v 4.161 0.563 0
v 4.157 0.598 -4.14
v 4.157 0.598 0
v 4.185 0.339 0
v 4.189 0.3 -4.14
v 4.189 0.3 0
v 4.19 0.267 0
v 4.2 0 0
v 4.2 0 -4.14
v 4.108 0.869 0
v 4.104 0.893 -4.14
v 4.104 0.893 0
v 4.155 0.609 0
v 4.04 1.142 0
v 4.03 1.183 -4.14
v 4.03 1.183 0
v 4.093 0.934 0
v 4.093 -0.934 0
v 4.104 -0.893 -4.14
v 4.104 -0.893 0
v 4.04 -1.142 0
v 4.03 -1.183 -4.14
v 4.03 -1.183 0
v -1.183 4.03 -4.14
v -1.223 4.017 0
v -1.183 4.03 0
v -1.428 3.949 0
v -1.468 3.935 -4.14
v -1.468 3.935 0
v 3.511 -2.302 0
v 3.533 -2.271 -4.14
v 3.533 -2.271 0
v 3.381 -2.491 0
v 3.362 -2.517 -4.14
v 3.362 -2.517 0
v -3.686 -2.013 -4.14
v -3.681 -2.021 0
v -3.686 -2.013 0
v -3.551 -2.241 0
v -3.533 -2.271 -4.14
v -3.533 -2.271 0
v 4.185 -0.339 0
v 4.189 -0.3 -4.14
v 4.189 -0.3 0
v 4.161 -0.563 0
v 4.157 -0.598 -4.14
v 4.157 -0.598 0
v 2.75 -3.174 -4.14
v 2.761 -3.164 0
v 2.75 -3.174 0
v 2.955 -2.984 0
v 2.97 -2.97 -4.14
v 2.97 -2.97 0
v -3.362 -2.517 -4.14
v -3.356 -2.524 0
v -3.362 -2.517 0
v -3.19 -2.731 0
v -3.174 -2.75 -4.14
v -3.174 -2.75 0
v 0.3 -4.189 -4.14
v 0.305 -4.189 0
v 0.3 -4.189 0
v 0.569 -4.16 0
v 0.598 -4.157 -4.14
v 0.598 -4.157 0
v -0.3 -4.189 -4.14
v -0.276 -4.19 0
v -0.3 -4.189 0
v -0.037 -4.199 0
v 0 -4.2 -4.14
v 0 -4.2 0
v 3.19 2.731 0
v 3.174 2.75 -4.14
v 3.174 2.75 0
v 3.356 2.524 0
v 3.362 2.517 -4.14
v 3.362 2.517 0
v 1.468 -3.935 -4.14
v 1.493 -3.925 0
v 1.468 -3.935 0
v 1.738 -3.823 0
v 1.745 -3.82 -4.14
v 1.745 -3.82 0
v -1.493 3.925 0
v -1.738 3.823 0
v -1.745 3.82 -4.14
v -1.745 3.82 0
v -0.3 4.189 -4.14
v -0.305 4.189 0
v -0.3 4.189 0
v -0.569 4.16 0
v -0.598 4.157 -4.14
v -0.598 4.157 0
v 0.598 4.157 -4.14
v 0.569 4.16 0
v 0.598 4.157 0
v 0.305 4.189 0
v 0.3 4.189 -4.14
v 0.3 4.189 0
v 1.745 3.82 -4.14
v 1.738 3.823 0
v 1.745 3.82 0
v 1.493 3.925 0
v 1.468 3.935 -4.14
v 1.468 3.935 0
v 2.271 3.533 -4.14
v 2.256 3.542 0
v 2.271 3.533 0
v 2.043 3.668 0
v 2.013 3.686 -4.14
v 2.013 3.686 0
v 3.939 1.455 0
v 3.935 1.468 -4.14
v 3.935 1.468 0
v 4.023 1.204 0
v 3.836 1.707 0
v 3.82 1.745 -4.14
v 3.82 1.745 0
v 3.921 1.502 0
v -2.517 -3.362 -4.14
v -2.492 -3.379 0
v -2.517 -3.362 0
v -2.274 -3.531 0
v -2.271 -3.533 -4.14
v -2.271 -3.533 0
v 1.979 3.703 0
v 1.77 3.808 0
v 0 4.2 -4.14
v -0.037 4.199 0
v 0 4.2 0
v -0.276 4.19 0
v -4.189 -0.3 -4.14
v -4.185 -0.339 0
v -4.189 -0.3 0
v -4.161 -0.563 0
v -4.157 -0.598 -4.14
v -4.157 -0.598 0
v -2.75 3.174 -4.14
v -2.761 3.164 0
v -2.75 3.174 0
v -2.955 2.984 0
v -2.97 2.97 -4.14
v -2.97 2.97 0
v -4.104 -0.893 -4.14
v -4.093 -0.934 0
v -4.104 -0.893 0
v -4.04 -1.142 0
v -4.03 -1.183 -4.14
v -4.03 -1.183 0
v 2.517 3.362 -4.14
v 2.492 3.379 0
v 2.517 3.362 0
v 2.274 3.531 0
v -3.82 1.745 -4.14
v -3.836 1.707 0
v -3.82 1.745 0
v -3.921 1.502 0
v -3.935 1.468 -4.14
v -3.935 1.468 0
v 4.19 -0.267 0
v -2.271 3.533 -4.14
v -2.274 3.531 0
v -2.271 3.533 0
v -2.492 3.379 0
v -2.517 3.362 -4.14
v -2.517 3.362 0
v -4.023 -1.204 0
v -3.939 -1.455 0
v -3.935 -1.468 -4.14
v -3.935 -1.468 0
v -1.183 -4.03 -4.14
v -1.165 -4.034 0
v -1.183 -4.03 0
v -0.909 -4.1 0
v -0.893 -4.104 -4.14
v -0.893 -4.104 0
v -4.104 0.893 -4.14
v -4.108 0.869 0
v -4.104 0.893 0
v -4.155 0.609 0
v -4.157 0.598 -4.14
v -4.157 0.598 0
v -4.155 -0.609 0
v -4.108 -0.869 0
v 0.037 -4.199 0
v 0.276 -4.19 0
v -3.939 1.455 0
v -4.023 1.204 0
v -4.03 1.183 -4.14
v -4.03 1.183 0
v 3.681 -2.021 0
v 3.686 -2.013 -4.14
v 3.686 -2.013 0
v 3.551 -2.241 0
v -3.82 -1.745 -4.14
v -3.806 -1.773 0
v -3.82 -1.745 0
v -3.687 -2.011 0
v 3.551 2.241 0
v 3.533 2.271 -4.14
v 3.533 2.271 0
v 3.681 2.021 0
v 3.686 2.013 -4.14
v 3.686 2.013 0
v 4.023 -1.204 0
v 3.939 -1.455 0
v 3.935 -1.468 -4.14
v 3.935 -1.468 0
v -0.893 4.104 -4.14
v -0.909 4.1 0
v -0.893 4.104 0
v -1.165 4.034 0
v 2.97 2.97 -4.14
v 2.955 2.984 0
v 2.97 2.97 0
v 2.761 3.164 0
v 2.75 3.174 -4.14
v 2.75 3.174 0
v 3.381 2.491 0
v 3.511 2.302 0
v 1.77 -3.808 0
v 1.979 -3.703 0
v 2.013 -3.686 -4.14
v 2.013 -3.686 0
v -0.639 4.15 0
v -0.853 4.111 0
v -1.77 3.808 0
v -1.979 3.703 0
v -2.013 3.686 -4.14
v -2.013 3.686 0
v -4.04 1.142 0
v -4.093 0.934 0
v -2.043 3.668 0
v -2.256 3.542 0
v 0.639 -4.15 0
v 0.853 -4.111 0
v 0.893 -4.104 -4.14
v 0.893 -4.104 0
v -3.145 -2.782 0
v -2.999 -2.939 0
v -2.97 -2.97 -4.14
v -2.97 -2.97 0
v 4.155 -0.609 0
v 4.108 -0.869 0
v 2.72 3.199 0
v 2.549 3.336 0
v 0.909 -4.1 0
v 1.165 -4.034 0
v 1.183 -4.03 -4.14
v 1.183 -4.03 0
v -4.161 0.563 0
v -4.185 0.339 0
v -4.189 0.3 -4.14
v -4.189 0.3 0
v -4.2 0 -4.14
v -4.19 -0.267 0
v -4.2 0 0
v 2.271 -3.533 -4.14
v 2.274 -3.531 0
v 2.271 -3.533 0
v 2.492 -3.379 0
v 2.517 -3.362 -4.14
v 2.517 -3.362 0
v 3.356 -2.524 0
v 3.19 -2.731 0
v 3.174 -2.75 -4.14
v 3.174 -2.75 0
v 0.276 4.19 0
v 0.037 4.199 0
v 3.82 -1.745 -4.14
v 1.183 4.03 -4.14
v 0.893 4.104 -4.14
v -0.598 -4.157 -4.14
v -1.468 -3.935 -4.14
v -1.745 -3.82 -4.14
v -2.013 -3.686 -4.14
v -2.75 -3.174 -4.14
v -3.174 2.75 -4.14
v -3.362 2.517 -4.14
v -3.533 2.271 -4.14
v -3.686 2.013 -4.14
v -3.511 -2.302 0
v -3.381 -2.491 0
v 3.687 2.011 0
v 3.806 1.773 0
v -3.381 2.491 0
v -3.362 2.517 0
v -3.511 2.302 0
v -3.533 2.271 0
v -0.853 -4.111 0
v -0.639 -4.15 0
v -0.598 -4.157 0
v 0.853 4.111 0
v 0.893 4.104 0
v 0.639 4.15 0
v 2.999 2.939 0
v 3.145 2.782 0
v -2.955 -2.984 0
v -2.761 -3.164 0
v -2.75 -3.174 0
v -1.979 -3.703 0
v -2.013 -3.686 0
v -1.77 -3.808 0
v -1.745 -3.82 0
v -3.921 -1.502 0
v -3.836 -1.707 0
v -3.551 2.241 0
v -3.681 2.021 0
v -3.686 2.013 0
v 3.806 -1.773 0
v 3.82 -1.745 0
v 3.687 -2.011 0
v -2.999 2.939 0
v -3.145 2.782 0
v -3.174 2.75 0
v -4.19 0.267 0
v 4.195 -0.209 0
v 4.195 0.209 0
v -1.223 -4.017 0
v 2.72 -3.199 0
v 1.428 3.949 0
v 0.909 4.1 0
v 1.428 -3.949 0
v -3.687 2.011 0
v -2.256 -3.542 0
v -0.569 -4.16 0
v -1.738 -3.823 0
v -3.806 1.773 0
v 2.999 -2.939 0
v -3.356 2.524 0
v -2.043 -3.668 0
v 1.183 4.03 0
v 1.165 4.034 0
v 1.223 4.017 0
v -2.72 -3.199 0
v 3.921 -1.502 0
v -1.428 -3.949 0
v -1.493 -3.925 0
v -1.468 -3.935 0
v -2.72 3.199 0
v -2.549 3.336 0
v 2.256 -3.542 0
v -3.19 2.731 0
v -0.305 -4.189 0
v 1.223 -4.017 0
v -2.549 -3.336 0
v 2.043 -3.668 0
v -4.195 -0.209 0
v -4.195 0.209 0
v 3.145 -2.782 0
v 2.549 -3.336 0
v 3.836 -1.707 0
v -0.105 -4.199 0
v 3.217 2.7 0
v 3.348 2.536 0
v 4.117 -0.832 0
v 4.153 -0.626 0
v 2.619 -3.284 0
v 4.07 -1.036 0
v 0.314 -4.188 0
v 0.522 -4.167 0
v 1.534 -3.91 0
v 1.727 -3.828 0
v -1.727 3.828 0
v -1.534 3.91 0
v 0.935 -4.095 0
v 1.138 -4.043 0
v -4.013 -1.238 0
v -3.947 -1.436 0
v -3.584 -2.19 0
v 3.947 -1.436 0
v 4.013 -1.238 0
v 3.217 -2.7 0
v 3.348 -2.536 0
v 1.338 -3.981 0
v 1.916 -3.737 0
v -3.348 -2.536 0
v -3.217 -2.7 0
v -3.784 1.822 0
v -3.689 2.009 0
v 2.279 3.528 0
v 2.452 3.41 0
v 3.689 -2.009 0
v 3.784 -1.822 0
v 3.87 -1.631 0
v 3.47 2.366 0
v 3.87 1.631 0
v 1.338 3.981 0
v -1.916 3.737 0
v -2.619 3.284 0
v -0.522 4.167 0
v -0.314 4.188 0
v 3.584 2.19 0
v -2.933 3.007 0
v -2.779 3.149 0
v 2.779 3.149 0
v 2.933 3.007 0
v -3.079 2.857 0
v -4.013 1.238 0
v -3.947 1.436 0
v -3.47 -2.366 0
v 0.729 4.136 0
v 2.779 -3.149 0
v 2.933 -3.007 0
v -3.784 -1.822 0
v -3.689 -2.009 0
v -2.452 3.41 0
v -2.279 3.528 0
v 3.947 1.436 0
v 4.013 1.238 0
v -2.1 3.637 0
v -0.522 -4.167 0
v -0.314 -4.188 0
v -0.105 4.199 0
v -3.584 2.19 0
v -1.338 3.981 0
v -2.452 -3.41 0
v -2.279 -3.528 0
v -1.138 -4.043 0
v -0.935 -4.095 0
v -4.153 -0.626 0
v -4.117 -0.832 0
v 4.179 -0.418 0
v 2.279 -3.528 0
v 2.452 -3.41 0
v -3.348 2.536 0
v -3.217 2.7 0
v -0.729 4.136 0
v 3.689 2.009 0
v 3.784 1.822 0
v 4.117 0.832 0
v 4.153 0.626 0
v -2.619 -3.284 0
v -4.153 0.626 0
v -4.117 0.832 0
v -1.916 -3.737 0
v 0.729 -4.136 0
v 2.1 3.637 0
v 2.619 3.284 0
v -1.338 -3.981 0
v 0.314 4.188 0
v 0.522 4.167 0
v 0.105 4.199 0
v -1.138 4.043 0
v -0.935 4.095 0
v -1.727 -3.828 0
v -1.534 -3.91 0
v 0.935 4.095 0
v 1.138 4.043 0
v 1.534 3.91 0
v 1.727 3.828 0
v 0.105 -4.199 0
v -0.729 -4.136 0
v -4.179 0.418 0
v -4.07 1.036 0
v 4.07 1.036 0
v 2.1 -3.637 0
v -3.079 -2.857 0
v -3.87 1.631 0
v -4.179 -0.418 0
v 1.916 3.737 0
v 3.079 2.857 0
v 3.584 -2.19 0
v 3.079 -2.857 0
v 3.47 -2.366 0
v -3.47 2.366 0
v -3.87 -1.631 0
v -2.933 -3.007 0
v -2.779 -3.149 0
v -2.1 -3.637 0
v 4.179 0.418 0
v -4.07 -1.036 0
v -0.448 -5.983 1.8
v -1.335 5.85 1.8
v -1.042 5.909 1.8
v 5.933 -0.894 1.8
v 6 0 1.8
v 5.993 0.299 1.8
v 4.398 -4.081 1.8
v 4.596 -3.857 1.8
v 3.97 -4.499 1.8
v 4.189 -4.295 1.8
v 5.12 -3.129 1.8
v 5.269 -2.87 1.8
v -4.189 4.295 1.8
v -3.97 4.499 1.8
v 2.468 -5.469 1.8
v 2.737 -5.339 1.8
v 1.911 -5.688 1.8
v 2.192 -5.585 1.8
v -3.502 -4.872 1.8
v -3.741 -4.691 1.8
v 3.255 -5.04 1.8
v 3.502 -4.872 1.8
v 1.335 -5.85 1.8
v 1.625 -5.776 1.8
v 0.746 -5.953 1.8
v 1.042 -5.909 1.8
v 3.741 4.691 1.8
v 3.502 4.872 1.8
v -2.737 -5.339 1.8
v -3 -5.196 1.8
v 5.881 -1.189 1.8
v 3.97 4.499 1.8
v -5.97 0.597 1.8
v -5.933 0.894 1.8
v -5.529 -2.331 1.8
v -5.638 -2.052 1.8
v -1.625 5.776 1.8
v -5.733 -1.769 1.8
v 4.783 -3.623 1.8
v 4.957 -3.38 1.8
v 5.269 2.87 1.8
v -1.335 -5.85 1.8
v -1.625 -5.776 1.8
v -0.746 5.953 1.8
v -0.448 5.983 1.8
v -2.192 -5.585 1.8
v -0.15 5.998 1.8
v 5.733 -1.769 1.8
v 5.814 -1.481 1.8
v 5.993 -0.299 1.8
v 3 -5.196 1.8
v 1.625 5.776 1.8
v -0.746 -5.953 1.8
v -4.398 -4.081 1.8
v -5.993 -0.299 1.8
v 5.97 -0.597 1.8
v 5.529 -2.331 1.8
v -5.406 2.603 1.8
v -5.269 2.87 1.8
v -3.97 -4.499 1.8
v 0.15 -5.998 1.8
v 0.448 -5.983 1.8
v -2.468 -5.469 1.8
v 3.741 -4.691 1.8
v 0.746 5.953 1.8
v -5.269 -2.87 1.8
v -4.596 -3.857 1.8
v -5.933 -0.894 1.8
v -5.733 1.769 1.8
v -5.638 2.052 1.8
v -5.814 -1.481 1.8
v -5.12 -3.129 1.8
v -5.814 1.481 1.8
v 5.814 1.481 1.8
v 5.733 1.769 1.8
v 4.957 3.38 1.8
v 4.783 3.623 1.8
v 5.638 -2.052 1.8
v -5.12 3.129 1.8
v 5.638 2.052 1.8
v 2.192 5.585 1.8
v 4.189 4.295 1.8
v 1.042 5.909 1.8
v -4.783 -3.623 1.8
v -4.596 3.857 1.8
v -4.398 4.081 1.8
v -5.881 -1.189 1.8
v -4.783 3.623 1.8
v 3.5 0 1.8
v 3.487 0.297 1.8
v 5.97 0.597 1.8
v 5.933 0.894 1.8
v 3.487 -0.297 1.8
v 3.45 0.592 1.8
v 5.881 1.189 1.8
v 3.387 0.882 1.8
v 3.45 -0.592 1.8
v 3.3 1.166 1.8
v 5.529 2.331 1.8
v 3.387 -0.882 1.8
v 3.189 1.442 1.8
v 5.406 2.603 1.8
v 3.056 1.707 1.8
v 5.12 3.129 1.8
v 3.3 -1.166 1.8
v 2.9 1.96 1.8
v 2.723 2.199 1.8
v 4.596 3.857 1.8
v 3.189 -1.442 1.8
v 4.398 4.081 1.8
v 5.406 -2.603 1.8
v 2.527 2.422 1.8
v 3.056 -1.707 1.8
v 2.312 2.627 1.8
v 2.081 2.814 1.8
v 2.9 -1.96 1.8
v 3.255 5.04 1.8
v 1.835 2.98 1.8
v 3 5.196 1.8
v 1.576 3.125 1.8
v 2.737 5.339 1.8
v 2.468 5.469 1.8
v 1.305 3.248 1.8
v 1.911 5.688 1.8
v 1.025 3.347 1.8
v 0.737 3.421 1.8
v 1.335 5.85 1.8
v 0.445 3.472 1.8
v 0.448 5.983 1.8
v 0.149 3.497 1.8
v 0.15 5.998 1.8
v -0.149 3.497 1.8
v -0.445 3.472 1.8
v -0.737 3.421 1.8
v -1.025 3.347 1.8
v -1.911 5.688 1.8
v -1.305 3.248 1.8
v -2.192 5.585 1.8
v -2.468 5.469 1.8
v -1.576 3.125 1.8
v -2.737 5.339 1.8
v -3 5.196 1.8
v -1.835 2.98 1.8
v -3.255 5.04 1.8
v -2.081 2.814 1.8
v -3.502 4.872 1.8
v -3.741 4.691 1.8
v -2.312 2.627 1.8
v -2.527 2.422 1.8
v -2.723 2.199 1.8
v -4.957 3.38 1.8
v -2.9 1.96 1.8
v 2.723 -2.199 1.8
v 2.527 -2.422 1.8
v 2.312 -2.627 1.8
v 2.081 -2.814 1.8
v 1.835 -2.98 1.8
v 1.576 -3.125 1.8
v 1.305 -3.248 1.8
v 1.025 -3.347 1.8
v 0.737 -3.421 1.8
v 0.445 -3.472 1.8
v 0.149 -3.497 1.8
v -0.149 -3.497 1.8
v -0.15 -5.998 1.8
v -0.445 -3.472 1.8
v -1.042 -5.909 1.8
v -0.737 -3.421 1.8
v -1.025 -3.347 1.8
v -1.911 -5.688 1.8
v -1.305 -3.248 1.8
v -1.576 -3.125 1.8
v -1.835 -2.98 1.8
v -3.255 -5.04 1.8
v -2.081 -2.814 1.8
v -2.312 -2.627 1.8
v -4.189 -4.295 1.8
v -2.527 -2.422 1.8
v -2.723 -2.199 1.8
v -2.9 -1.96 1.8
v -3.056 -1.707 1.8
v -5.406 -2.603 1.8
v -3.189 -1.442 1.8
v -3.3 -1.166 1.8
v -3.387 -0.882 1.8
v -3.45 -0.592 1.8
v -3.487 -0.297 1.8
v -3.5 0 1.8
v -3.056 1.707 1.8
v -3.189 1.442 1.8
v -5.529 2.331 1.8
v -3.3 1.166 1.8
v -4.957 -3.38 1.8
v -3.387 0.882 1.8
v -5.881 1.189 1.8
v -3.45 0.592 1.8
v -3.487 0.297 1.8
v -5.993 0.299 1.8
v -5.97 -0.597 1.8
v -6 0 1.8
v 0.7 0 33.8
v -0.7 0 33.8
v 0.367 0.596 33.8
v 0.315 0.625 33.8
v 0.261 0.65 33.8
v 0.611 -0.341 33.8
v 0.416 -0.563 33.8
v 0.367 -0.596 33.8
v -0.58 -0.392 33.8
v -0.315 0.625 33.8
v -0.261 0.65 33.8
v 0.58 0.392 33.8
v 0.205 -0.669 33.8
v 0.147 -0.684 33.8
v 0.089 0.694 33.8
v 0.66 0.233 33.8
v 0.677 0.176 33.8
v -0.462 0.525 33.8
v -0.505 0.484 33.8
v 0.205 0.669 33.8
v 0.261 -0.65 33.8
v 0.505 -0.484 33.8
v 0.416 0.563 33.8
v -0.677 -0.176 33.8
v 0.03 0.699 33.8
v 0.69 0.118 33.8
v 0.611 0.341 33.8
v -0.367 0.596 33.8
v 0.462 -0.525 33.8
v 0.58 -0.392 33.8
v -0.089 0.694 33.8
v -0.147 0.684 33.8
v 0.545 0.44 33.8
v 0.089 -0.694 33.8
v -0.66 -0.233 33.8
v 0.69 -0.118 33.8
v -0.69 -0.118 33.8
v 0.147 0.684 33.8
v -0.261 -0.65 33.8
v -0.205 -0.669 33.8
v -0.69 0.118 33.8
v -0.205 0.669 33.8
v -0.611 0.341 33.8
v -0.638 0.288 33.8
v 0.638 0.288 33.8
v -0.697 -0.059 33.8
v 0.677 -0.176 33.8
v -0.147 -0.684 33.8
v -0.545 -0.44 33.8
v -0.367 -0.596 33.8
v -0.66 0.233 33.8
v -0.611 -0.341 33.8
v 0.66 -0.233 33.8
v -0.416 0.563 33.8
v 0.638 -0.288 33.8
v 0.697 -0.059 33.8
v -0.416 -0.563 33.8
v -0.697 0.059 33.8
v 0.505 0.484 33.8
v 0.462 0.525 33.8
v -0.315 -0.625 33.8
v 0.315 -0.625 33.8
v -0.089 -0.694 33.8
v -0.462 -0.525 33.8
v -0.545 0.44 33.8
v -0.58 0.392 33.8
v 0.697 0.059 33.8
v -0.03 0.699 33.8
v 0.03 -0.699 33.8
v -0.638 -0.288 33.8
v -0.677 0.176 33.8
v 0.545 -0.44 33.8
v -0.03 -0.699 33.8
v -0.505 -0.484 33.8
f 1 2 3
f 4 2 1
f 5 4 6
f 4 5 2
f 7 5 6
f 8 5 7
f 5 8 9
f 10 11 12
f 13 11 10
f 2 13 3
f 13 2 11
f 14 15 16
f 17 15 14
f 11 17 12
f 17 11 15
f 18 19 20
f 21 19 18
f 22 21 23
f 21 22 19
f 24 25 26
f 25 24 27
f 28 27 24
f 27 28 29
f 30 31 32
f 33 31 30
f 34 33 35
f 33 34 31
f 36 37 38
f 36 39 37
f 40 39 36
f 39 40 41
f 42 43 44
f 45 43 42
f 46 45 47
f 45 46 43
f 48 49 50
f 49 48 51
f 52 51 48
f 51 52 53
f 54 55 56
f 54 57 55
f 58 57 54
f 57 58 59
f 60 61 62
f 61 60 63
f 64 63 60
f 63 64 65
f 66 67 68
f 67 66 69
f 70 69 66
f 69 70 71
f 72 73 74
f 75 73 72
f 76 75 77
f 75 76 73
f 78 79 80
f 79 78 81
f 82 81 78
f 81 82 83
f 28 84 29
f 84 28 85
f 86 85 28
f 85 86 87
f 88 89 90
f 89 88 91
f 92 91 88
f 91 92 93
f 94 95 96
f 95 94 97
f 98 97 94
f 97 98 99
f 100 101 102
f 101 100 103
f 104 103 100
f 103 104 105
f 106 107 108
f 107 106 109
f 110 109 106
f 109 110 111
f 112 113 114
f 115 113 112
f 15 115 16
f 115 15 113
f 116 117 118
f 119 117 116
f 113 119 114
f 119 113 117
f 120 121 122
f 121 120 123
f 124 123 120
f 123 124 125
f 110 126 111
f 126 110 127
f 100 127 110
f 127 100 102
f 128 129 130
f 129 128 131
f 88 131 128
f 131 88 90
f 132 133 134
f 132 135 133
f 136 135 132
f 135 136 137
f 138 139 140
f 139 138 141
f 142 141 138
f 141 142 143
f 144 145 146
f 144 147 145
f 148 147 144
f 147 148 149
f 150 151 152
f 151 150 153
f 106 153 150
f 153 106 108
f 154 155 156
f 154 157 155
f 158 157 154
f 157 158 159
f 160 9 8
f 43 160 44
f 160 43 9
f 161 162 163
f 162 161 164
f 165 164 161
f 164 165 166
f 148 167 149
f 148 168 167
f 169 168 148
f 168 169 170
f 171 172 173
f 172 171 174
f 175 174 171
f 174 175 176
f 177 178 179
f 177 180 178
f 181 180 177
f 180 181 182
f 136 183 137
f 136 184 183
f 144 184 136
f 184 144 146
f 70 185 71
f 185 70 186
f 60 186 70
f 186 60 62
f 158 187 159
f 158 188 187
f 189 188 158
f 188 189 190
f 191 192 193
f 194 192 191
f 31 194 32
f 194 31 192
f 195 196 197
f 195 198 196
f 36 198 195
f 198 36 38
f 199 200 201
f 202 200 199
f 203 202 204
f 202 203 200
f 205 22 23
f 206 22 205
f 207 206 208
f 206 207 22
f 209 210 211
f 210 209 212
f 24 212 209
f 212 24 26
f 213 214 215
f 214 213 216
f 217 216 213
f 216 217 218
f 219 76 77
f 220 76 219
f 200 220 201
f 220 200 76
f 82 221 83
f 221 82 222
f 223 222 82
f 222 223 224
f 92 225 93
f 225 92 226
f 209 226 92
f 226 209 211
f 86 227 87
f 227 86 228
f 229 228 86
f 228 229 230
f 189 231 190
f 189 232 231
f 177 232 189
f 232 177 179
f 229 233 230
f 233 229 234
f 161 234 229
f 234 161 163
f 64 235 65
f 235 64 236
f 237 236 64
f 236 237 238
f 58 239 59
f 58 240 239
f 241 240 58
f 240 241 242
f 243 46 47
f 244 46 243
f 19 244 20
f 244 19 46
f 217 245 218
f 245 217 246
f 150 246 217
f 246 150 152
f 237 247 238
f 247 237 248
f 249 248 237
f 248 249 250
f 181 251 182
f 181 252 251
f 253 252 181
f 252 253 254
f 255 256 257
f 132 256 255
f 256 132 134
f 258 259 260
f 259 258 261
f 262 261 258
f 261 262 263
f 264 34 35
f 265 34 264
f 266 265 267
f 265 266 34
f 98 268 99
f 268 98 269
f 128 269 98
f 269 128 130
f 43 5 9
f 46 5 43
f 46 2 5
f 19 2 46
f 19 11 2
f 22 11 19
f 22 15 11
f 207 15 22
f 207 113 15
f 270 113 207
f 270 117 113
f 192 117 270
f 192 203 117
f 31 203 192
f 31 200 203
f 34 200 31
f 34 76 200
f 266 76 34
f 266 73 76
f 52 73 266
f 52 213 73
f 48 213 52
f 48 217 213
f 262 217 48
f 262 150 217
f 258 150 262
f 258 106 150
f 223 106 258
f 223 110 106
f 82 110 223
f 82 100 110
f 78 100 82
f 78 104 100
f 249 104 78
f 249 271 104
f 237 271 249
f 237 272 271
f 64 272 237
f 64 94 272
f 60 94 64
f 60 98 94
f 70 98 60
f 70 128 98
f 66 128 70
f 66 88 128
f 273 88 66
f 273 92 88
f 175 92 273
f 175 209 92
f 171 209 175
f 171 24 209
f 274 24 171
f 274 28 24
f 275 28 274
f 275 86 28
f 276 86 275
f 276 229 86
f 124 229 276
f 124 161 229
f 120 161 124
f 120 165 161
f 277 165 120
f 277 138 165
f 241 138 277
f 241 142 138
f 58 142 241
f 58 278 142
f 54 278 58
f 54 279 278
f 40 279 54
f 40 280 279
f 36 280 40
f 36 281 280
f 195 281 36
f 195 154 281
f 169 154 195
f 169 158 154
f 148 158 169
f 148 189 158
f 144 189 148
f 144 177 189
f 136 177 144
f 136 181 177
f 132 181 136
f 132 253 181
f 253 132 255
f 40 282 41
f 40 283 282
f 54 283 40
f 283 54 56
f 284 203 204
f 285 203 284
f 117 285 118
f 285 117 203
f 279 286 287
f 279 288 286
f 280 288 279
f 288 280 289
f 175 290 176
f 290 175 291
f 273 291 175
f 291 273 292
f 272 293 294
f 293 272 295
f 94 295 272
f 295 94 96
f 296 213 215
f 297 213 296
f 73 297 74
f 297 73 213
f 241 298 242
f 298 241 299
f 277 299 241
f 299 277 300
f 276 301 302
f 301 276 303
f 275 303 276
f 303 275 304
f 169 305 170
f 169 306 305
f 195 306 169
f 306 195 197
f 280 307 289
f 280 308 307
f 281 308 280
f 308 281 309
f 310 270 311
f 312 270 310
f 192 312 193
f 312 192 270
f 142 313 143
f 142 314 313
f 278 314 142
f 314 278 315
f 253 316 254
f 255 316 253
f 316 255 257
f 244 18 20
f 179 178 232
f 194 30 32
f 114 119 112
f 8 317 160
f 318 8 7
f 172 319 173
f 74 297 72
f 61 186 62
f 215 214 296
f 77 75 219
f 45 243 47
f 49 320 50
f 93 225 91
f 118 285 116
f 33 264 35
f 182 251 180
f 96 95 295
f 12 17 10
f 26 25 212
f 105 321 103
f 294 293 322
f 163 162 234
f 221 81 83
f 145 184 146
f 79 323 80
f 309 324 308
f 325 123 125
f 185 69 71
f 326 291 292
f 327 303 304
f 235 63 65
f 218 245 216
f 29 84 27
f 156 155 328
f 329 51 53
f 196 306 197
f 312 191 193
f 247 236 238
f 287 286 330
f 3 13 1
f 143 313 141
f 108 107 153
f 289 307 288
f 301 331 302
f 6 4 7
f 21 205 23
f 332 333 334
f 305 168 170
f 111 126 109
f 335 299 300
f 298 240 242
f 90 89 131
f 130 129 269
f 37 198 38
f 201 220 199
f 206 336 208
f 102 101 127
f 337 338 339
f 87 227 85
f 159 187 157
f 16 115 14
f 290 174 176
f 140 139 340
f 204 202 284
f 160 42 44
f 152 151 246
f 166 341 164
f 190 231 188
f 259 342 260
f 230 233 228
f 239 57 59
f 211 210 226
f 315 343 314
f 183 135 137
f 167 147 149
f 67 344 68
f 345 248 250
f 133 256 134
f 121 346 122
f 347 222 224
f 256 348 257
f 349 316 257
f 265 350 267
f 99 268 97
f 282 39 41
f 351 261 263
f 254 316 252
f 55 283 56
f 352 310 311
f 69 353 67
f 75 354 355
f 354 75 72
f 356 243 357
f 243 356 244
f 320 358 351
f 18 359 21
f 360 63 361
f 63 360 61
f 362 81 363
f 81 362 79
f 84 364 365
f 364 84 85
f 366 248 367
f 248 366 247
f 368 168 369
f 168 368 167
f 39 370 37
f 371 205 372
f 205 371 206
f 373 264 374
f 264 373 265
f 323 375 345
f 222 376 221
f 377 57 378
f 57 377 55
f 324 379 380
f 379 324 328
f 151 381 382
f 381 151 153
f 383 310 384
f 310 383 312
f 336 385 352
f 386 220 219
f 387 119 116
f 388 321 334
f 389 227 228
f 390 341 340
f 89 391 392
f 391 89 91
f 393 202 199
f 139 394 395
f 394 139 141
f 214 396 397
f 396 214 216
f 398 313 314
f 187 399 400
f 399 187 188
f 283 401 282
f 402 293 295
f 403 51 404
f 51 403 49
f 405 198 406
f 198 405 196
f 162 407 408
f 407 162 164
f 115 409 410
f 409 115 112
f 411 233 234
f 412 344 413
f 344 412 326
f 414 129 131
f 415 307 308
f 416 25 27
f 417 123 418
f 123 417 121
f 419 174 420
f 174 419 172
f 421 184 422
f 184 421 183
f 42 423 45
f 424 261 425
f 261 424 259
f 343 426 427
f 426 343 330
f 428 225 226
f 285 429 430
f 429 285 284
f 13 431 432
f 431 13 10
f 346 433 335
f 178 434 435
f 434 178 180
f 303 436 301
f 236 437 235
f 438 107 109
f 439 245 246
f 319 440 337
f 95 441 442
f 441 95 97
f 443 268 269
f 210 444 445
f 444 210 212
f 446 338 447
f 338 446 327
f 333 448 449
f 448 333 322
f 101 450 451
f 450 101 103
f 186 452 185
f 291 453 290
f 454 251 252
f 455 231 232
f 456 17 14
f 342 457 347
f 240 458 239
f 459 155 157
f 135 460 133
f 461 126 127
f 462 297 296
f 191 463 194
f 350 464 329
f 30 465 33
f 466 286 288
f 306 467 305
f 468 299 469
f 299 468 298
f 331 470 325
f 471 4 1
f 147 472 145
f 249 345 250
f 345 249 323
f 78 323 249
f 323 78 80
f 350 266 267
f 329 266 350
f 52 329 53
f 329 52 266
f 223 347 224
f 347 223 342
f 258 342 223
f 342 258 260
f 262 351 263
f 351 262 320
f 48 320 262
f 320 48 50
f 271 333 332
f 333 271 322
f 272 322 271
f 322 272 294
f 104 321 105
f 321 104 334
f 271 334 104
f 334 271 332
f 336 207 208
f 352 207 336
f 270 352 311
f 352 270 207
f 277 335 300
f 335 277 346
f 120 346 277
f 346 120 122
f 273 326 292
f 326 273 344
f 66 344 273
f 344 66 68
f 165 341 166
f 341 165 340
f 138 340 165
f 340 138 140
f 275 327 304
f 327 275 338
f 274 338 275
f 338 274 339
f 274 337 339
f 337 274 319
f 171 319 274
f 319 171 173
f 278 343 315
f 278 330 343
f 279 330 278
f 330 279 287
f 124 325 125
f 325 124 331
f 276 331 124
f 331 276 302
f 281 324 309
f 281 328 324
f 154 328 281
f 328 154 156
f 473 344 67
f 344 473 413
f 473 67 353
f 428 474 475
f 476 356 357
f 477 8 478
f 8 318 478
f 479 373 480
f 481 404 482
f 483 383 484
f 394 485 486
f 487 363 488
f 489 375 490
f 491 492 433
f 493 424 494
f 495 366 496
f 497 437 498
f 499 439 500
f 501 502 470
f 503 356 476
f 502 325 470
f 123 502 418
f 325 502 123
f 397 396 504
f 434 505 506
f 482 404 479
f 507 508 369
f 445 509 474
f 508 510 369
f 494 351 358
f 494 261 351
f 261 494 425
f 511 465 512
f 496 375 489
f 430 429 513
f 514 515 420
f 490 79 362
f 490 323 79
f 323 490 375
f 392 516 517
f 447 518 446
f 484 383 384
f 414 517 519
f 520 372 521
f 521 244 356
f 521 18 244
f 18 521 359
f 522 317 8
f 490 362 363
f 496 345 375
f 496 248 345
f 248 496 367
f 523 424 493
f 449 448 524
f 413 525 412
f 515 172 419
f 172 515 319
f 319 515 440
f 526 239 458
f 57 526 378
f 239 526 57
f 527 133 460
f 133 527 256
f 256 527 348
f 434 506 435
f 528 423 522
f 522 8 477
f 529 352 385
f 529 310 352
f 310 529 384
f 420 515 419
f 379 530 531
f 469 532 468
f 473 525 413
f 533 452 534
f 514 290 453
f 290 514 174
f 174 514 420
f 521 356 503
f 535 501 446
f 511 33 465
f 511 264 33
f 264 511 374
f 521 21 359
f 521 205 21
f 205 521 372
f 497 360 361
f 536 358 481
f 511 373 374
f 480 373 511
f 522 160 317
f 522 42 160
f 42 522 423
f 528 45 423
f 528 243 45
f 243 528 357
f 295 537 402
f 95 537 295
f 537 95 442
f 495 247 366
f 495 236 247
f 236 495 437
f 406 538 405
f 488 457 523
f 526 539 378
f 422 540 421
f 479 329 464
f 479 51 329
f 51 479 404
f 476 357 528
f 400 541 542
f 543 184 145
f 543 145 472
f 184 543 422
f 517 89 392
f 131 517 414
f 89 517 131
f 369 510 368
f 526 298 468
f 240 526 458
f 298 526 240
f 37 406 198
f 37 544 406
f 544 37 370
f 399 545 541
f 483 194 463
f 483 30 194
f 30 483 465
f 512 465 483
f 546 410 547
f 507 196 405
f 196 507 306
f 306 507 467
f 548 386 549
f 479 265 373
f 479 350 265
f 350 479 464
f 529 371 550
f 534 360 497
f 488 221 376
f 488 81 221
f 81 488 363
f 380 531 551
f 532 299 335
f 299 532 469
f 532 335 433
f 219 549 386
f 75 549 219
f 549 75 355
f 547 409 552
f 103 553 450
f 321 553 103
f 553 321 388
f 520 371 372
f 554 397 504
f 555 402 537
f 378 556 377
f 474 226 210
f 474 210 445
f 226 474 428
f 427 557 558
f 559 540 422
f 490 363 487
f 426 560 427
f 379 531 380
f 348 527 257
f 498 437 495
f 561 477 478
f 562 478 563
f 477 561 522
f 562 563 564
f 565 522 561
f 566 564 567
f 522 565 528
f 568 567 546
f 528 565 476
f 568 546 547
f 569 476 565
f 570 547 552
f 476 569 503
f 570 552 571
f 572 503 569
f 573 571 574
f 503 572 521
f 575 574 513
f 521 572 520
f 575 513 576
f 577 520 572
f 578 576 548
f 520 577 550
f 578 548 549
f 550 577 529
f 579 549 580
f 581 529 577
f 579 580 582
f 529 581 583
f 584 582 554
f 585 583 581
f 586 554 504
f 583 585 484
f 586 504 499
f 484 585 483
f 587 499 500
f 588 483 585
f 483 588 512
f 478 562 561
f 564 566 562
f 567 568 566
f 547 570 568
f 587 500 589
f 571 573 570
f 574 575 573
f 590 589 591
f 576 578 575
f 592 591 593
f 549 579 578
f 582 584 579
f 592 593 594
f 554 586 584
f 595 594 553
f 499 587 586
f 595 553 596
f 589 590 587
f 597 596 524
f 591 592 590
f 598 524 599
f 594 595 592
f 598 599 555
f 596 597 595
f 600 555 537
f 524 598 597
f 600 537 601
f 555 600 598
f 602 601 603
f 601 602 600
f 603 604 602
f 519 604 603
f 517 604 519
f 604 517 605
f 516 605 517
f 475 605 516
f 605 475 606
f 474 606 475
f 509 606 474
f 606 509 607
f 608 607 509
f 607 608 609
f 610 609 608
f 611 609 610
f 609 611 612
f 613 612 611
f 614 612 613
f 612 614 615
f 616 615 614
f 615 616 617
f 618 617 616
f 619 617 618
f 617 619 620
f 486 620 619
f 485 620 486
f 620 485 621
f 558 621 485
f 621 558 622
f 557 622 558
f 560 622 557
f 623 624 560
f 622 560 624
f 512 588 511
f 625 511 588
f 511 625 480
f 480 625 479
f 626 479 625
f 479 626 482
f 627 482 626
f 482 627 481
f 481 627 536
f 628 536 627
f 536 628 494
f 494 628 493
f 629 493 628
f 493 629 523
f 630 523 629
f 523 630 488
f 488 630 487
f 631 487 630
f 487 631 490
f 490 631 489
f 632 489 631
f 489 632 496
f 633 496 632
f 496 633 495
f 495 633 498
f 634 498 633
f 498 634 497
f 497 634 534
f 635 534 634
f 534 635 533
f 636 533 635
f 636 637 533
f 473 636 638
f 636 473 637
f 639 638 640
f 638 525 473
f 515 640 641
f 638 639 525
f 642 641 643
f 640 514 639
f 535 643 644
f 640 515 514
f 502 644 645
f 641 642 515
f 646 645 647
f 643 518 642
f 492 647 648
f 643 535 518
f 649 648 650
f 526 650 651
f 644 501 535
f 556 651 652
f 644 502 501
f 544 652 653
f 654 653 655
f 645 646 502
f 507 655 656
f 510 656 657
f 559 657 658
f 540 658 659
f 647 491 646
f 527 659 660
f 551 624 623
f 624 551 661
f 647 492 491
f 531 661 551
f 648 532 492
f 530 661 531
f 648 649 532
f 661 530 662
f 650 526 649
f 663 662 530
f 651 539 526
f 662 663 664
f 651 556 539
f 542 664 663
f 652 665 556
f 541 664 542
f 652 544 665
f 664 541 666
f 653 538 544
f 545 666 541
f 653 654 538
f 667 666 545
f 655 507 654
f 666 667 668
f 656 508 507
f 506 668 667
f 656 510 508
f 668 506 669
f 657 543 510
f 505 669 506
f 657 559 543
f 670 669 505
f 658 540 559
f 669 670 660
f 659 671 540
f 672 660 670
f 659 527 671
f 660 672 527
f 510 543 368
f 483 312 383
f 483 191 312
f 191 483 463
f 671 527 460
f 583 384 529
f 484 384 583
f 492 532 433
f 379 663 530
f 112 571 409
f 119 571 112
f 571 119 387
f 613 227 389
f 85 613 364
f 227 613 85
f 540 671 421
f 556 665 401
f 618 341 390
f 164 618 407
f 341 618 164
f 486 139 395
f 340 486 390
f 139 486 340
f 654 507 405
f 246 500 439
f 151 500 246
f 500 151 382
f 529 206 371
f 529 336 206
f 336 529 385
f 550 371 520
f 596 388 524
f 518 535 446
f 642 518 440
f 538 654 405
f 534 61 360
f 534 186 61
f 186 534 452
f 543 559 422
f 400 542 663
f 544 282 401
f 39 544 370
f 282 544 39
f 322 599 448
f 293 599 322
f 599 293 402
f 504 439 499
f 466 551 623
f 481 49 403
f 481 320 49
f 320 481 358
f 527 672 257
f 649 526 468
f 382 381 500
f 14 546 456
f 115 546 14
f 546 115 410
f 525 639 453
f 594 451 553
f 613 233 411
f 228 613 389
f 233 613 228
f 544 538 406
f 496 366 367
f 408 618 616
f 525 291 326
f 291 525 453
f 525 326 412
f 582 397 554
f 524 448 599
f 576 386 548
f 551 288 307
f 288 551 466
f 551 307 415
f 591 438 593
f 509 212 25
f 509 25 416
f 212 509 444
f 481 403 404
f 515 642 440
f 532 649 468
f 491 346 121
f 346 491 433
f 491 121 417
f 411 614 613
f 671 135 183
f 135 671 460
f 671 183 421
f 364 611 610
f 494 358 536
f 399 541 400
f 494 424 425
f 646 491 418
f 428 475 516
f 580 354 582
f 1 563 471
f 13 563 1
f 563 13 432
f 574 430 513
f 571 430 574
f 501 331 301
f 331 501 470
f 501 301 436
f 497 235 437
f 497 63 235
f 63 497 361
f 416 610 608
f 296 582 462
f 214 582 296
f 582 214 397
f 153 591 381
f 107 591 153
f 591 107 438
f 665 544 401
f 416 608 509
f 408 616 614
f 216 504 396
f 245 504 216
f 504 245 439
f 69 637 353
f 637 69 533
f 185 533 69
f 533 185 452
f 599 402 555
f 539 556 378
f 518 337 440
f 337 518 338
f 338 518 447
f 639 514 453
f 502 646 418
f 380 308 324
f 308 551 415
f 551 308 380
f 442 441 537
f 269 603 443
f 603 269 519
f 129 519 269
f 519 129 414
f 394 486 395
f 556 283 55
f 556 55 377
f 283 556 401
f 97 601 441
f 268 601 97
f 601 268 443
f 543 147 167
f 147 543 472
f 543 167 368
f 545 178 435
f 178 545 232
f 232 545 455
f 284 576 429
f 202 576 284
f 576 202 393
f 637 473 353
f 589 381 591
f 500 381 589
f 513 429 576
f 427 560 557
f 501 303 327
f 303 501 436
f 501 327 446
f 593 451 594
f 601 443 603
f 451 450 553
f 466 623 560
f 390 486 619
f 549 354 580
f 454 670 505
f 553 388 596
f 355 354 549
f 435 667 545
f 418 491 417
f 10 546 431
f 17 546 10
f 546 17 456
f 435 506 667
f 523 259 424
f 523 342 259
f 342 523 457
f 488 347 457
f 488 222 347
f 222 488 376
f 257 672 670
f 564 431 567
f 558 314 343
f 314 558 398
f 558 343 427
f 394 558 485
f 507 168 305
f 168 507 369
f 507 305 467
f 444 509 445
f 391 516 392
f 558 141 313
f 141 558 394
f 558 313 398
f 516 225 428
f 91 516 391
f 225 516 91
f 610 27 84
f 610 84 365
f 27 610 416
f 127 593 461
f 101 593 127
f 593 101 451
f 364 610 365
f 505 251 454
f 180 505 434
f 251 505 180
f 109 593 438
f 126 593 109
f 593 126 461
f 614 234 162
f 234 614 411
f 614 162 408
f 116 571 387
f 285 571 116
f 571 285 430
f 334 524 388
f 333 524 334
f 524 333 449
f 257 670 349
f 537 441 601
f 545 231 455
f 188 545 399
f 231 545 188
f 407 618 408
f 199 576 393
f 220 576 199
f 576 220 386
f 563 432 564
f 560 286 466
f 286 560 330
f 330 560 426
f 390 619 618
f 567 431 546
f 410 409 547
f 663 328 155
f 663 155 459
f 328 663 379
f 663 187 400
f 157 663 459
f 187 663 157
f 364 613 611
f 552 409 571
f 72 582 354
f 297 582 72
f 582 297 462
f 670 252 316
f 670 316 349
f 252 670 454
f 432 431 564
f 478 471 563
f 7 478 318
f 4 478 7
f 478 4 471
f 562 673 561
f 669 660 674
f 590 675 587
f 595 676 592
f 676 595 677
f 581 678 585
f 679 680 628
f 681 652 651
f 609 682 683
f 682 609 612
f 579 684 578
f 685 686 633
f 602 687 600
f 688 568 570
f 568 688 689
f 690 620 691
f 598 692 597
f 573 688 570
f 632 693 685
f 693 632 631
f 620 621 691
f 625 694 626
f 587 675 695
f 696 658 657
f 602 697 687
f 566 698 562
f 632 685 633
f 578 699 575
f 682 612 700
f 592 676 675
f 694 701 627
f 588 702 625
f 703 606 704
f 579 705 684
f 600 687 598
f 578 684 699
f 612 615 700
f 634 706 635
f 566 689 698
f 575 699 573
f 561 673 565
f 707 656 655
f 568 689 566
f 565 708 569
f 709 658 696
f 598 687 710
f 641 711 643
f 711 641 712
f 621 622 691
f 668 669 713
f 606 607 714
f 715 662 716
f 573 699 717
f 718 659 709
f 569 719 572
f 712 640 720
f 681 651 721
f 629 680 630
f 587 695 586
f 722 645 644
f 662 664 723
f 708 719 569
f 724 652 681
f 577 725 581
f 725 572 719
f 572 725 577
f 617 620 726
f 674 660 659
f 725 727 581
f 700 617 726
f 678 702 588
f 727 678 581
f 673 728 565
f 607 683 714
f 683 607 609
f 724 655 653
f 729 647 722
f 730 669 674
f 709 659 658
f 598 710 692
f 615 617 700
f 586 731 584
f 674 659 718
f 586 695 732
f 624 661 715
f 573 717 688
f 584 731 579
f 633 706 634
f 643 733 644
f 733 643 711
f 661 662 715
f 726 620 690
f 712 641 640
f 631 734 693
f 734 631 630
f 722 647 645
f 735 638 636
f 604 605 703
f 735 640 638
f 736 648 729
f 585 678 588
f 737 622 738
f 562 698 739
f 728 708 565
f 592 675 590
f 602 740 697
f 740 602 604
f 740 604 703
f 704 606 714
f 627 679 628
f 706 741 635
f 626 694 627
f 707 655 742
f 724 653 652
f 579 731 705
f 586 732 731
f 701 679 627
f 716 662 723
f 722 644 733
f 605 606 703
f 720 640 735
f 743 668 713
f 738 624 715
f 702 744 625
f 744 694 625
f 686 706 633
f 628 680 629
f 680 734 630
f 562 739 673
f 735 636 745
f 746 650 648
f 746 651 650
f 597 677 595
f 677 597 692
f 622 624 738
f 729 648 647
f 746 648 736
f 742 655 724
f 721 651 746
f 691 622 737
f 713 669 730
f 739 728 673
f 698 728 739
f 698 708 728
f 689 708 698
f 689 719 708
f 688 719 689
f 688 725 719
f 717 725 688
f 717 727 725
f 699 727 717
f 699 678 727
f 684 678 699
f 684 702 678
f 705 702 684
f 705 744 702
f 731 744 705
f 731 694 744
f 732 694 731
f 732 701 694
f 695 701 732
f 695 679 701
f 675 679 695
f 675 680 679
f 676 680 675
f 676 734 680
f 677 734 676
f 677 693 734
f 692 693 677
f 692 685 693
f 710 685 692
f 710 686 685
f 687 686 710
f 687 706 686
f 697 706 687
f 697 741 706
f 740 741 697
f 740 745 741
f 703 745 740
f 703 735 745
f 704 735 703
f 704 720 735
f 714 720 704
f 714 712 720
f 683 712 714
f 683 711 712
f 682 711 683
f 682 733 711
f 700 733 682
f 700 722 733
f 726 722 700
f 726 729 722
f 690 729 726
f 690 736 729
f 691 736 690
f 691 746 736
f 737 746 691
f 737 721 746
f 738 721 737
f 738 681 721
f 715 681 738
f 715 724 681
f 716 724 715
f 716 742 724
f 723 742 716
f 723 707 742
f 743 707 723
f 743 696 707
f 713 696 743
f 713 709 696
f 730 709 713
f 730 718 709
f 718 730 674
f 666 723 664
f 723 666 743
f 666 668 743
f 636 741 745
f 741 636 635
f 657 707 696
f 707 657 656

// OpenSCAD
// Nails for the bat's honeycomb: a spike on a flared head, plugged into a hexagon.
//
// The hexagons are a straight prism through the shell — 8.47 across the flats,
// 9.40 across the corners, unchanged from bore to outside, in a 2.54 wall.
//
// The plug is round rather than hexagonal, sized to the flats, so it bears on
// all six and goes in at any rotation: with twenty of these to push home, not
// having to clock each one is worth more than the corner contact.
//
// The head is a 45 degree cone rather than a disc. A disc would have to be
// dished to sit on a Ø78.6 shell, and printed plug-down its rim would be a
// 2.4 mm overhang on the very face that has to seat. A cone seats on its inner
// edge whatever the curvature, prints without support, and looks like a stud.
//
// Z is the nail's axis, 0 at the shell's outer surface, pointing outward. It
// prints as modelled: plug on the bed, spike up.

// parts: nail test fit

part = "nail"; // [nail, test, fit]

/* [The shell, measured off the mesh] */
hex_flats = 8.47;       // mm, across the flats
shell_wall = 2.54;      // mm

/* [Fit] */
// A ladder of press fits put Ø8.50 tight and Ø8.30 snug in a printed hexagon,
// so the hole comes out close to its drawn 8.47 and the plug wants to be 8.40.
fit = 0.07;             // mm off the flats
hex_plug = false;       // true bears on the whole flat, but has to be clocked
grip = 0;               // mm the lip stands proud, each side: 0 is a press fit
plug_bore = 5.0;        // mm, hollow so the lip's legs can give
slots = 4;              // they start at the bore, not the axis
slot_w = 1.1;           // mm
lead_in = 0.7;          // mm of chamfer at the entering end
lip_h = 1.4;            // mm from the plug's end to the lip's catch face
behind = 1.0;           // mm the catch sits past the inner surface

/* [Nail] */
head_d = 12;            // mm at its widest
spike_d = 7;            // mm where it leaves the head
spike_len = 32;         // mm clear of the shell
tip_d = 1.4;            // mm: blunt enough to print, and to carry about

/* [Test ladder] */
test_spike = 12;        // mm, a stub: this is about the fit, not the look
test_fits = [-0.03, 0.17, 0.37, 0.57, 0.77, 0.97];
// a hollow, slotted plug has no middle to number, so these two are told apart
// by their slots: two on the first, four on the second
test_grips = [0.37, 0.57];
test_slots = [2, 4];
test_pitch = 16;        // mm between pieces

$fa = 2;
$fs = 0.3;

plug_len = shell_wall + behind;

// The plug reaches past the wall far enough to put the lip's CATCH outside it,
// not the lip's tip. Getting that wrong buries the barb in the hole, where it
// grips by friction when it grips at all.
function plug_depth(grip) = shell_wall + behind + (grip > 0 ? lip_h : 0.6);

// hex is passed in, not read from the global: a module does not see its
// caller's locals, so reading it here silently printed every plug round
module prism(d, h, taper = 0, hex = hex_plug) {
    if (hex) rotate([0, 0, 90])
        cylinder(r1 = (d - 2 * taper) / sqrt(3), r2 = d / sqrt(3), h = h, $fn = 6);
    else cylinder(d1 = d - 2 * taper, d2 = d, h = h);
}

module nail(fit = fit, grip = grip, spike = spike_len, label = "", slots = slots,
            hex_plug = hex_plug) {
    plug_d = hex_flats - fit;
    plug_len = plug_depth(grip);
    head_h = (head_d - plug_d) / 2;         // 45 deg
    difference() {
        union() {
            translate([0, 0, -plug_len]) prism(plug_d, plug_len, hex = hex_plug);
            if (grip > 0) translate([0, 0, -plug_len]) {
                prism(plug_d + 2 * grip, lip_h, taper = lead_in + grip, hex = hex_plug);
                translate([0, 0, lip_h - 0.01]) prism(plug_d, 0.02, hex = hex_plug);
            } else translate([0, 0, -plug_len])
                prism(plug_d, lead_in, taper = lead_in, hex = hex_plug);
            cylinder(d1 = plug_d, d2 = head_d, h = head_h);
            translate([0, 0, head_h]) cylinder(d1 = spike_d, d2 = tip_d, h = spike);
        }
        if (grip > 0) {
            translate([0, 0, -plug_len - 0.01]) cylinder(d = plug_bore, h = plug_len + 0.5);
            for (k = [0 : slots - 1]) rotate([0, 0, k * 360 / slots])
                translate([-slot_w / 2, plug_bore / 2 - 0.3, -plug_len - 0.01])
                    cube([slot_w, plug_d, plug_len + 0.4]);
        }
        // the number goes on the end you are looking at as you push it in,
        // and on the bed, so it comes out crisp
        if (label != "")
            translate([0, 0, -plug_len - 0.01])
                linear_extrude(0.45)
                    text(label, size = 3.4, halign = "center", valign = "center",
                         font = "Liberation Sans:style=Bold");
    }
}

// Second ladder: the plug sizes the first one pointed at, now with the barb's
// catch where it belongs, and the same two sizes as hexagons for comparison.
// 1-3 and 5 are numbered; 4 and 6 are the slotted ones, round and hex.
fit_round = [0.02, 0.07, 0.12];
fit_snap = 0.12;
fit_hexes = [0.07, 0.12];

module fit() {
    for (i = [0 : 2]) translate([i * test_pitch, 0, plug_depth(0)])
        nail(fit = fit_round[i], spike = test_spike, label = str(i + 1));
    translate([3 * test_pitch, 0, plug_depth(0.4)])
        nail(fit = fit_snap, grip = 0.4, spike = test_spike);
    translate([4 * test_pitch, 0, plug_depth(0)])
        nail(fit = fit_hexes[0], spike = test_spike, label = "5", hex_plug = true);
    translate([5 * test_pitch, 0, plug_depth(0.4)])
        nail(fit = fit_hexes[1], grip = 0.4, spike = test_spike, hex_plug = true);
}

module test() {
    for (i = [0 : len(test_fits) - 1])
        translate([i * test_pitch, 0, plug_len])
            nail(fit = test_fits[i], grip = 0, spike = test_spike, label = str(i + 1));
    for (i = [0 : len(test_grips) - 1])
        translate([(len(test_fits) + i) * test_pitch, 0, plug_len])
            nail(fit = test_grips[i], grip = 0.45, spike = test_spike, slots = test_slots[i]);
}

echo(str("nail: plug Ø", hex_flats - fit, ", ", plug_depth(0), " deep; barbed plug ",
         plug_depth(0.4), " deep so its catch clears a ", shell_wall, " wall by ", behind));

if (part == "fit") fit();
else if (part == "test") test();
else nail();
